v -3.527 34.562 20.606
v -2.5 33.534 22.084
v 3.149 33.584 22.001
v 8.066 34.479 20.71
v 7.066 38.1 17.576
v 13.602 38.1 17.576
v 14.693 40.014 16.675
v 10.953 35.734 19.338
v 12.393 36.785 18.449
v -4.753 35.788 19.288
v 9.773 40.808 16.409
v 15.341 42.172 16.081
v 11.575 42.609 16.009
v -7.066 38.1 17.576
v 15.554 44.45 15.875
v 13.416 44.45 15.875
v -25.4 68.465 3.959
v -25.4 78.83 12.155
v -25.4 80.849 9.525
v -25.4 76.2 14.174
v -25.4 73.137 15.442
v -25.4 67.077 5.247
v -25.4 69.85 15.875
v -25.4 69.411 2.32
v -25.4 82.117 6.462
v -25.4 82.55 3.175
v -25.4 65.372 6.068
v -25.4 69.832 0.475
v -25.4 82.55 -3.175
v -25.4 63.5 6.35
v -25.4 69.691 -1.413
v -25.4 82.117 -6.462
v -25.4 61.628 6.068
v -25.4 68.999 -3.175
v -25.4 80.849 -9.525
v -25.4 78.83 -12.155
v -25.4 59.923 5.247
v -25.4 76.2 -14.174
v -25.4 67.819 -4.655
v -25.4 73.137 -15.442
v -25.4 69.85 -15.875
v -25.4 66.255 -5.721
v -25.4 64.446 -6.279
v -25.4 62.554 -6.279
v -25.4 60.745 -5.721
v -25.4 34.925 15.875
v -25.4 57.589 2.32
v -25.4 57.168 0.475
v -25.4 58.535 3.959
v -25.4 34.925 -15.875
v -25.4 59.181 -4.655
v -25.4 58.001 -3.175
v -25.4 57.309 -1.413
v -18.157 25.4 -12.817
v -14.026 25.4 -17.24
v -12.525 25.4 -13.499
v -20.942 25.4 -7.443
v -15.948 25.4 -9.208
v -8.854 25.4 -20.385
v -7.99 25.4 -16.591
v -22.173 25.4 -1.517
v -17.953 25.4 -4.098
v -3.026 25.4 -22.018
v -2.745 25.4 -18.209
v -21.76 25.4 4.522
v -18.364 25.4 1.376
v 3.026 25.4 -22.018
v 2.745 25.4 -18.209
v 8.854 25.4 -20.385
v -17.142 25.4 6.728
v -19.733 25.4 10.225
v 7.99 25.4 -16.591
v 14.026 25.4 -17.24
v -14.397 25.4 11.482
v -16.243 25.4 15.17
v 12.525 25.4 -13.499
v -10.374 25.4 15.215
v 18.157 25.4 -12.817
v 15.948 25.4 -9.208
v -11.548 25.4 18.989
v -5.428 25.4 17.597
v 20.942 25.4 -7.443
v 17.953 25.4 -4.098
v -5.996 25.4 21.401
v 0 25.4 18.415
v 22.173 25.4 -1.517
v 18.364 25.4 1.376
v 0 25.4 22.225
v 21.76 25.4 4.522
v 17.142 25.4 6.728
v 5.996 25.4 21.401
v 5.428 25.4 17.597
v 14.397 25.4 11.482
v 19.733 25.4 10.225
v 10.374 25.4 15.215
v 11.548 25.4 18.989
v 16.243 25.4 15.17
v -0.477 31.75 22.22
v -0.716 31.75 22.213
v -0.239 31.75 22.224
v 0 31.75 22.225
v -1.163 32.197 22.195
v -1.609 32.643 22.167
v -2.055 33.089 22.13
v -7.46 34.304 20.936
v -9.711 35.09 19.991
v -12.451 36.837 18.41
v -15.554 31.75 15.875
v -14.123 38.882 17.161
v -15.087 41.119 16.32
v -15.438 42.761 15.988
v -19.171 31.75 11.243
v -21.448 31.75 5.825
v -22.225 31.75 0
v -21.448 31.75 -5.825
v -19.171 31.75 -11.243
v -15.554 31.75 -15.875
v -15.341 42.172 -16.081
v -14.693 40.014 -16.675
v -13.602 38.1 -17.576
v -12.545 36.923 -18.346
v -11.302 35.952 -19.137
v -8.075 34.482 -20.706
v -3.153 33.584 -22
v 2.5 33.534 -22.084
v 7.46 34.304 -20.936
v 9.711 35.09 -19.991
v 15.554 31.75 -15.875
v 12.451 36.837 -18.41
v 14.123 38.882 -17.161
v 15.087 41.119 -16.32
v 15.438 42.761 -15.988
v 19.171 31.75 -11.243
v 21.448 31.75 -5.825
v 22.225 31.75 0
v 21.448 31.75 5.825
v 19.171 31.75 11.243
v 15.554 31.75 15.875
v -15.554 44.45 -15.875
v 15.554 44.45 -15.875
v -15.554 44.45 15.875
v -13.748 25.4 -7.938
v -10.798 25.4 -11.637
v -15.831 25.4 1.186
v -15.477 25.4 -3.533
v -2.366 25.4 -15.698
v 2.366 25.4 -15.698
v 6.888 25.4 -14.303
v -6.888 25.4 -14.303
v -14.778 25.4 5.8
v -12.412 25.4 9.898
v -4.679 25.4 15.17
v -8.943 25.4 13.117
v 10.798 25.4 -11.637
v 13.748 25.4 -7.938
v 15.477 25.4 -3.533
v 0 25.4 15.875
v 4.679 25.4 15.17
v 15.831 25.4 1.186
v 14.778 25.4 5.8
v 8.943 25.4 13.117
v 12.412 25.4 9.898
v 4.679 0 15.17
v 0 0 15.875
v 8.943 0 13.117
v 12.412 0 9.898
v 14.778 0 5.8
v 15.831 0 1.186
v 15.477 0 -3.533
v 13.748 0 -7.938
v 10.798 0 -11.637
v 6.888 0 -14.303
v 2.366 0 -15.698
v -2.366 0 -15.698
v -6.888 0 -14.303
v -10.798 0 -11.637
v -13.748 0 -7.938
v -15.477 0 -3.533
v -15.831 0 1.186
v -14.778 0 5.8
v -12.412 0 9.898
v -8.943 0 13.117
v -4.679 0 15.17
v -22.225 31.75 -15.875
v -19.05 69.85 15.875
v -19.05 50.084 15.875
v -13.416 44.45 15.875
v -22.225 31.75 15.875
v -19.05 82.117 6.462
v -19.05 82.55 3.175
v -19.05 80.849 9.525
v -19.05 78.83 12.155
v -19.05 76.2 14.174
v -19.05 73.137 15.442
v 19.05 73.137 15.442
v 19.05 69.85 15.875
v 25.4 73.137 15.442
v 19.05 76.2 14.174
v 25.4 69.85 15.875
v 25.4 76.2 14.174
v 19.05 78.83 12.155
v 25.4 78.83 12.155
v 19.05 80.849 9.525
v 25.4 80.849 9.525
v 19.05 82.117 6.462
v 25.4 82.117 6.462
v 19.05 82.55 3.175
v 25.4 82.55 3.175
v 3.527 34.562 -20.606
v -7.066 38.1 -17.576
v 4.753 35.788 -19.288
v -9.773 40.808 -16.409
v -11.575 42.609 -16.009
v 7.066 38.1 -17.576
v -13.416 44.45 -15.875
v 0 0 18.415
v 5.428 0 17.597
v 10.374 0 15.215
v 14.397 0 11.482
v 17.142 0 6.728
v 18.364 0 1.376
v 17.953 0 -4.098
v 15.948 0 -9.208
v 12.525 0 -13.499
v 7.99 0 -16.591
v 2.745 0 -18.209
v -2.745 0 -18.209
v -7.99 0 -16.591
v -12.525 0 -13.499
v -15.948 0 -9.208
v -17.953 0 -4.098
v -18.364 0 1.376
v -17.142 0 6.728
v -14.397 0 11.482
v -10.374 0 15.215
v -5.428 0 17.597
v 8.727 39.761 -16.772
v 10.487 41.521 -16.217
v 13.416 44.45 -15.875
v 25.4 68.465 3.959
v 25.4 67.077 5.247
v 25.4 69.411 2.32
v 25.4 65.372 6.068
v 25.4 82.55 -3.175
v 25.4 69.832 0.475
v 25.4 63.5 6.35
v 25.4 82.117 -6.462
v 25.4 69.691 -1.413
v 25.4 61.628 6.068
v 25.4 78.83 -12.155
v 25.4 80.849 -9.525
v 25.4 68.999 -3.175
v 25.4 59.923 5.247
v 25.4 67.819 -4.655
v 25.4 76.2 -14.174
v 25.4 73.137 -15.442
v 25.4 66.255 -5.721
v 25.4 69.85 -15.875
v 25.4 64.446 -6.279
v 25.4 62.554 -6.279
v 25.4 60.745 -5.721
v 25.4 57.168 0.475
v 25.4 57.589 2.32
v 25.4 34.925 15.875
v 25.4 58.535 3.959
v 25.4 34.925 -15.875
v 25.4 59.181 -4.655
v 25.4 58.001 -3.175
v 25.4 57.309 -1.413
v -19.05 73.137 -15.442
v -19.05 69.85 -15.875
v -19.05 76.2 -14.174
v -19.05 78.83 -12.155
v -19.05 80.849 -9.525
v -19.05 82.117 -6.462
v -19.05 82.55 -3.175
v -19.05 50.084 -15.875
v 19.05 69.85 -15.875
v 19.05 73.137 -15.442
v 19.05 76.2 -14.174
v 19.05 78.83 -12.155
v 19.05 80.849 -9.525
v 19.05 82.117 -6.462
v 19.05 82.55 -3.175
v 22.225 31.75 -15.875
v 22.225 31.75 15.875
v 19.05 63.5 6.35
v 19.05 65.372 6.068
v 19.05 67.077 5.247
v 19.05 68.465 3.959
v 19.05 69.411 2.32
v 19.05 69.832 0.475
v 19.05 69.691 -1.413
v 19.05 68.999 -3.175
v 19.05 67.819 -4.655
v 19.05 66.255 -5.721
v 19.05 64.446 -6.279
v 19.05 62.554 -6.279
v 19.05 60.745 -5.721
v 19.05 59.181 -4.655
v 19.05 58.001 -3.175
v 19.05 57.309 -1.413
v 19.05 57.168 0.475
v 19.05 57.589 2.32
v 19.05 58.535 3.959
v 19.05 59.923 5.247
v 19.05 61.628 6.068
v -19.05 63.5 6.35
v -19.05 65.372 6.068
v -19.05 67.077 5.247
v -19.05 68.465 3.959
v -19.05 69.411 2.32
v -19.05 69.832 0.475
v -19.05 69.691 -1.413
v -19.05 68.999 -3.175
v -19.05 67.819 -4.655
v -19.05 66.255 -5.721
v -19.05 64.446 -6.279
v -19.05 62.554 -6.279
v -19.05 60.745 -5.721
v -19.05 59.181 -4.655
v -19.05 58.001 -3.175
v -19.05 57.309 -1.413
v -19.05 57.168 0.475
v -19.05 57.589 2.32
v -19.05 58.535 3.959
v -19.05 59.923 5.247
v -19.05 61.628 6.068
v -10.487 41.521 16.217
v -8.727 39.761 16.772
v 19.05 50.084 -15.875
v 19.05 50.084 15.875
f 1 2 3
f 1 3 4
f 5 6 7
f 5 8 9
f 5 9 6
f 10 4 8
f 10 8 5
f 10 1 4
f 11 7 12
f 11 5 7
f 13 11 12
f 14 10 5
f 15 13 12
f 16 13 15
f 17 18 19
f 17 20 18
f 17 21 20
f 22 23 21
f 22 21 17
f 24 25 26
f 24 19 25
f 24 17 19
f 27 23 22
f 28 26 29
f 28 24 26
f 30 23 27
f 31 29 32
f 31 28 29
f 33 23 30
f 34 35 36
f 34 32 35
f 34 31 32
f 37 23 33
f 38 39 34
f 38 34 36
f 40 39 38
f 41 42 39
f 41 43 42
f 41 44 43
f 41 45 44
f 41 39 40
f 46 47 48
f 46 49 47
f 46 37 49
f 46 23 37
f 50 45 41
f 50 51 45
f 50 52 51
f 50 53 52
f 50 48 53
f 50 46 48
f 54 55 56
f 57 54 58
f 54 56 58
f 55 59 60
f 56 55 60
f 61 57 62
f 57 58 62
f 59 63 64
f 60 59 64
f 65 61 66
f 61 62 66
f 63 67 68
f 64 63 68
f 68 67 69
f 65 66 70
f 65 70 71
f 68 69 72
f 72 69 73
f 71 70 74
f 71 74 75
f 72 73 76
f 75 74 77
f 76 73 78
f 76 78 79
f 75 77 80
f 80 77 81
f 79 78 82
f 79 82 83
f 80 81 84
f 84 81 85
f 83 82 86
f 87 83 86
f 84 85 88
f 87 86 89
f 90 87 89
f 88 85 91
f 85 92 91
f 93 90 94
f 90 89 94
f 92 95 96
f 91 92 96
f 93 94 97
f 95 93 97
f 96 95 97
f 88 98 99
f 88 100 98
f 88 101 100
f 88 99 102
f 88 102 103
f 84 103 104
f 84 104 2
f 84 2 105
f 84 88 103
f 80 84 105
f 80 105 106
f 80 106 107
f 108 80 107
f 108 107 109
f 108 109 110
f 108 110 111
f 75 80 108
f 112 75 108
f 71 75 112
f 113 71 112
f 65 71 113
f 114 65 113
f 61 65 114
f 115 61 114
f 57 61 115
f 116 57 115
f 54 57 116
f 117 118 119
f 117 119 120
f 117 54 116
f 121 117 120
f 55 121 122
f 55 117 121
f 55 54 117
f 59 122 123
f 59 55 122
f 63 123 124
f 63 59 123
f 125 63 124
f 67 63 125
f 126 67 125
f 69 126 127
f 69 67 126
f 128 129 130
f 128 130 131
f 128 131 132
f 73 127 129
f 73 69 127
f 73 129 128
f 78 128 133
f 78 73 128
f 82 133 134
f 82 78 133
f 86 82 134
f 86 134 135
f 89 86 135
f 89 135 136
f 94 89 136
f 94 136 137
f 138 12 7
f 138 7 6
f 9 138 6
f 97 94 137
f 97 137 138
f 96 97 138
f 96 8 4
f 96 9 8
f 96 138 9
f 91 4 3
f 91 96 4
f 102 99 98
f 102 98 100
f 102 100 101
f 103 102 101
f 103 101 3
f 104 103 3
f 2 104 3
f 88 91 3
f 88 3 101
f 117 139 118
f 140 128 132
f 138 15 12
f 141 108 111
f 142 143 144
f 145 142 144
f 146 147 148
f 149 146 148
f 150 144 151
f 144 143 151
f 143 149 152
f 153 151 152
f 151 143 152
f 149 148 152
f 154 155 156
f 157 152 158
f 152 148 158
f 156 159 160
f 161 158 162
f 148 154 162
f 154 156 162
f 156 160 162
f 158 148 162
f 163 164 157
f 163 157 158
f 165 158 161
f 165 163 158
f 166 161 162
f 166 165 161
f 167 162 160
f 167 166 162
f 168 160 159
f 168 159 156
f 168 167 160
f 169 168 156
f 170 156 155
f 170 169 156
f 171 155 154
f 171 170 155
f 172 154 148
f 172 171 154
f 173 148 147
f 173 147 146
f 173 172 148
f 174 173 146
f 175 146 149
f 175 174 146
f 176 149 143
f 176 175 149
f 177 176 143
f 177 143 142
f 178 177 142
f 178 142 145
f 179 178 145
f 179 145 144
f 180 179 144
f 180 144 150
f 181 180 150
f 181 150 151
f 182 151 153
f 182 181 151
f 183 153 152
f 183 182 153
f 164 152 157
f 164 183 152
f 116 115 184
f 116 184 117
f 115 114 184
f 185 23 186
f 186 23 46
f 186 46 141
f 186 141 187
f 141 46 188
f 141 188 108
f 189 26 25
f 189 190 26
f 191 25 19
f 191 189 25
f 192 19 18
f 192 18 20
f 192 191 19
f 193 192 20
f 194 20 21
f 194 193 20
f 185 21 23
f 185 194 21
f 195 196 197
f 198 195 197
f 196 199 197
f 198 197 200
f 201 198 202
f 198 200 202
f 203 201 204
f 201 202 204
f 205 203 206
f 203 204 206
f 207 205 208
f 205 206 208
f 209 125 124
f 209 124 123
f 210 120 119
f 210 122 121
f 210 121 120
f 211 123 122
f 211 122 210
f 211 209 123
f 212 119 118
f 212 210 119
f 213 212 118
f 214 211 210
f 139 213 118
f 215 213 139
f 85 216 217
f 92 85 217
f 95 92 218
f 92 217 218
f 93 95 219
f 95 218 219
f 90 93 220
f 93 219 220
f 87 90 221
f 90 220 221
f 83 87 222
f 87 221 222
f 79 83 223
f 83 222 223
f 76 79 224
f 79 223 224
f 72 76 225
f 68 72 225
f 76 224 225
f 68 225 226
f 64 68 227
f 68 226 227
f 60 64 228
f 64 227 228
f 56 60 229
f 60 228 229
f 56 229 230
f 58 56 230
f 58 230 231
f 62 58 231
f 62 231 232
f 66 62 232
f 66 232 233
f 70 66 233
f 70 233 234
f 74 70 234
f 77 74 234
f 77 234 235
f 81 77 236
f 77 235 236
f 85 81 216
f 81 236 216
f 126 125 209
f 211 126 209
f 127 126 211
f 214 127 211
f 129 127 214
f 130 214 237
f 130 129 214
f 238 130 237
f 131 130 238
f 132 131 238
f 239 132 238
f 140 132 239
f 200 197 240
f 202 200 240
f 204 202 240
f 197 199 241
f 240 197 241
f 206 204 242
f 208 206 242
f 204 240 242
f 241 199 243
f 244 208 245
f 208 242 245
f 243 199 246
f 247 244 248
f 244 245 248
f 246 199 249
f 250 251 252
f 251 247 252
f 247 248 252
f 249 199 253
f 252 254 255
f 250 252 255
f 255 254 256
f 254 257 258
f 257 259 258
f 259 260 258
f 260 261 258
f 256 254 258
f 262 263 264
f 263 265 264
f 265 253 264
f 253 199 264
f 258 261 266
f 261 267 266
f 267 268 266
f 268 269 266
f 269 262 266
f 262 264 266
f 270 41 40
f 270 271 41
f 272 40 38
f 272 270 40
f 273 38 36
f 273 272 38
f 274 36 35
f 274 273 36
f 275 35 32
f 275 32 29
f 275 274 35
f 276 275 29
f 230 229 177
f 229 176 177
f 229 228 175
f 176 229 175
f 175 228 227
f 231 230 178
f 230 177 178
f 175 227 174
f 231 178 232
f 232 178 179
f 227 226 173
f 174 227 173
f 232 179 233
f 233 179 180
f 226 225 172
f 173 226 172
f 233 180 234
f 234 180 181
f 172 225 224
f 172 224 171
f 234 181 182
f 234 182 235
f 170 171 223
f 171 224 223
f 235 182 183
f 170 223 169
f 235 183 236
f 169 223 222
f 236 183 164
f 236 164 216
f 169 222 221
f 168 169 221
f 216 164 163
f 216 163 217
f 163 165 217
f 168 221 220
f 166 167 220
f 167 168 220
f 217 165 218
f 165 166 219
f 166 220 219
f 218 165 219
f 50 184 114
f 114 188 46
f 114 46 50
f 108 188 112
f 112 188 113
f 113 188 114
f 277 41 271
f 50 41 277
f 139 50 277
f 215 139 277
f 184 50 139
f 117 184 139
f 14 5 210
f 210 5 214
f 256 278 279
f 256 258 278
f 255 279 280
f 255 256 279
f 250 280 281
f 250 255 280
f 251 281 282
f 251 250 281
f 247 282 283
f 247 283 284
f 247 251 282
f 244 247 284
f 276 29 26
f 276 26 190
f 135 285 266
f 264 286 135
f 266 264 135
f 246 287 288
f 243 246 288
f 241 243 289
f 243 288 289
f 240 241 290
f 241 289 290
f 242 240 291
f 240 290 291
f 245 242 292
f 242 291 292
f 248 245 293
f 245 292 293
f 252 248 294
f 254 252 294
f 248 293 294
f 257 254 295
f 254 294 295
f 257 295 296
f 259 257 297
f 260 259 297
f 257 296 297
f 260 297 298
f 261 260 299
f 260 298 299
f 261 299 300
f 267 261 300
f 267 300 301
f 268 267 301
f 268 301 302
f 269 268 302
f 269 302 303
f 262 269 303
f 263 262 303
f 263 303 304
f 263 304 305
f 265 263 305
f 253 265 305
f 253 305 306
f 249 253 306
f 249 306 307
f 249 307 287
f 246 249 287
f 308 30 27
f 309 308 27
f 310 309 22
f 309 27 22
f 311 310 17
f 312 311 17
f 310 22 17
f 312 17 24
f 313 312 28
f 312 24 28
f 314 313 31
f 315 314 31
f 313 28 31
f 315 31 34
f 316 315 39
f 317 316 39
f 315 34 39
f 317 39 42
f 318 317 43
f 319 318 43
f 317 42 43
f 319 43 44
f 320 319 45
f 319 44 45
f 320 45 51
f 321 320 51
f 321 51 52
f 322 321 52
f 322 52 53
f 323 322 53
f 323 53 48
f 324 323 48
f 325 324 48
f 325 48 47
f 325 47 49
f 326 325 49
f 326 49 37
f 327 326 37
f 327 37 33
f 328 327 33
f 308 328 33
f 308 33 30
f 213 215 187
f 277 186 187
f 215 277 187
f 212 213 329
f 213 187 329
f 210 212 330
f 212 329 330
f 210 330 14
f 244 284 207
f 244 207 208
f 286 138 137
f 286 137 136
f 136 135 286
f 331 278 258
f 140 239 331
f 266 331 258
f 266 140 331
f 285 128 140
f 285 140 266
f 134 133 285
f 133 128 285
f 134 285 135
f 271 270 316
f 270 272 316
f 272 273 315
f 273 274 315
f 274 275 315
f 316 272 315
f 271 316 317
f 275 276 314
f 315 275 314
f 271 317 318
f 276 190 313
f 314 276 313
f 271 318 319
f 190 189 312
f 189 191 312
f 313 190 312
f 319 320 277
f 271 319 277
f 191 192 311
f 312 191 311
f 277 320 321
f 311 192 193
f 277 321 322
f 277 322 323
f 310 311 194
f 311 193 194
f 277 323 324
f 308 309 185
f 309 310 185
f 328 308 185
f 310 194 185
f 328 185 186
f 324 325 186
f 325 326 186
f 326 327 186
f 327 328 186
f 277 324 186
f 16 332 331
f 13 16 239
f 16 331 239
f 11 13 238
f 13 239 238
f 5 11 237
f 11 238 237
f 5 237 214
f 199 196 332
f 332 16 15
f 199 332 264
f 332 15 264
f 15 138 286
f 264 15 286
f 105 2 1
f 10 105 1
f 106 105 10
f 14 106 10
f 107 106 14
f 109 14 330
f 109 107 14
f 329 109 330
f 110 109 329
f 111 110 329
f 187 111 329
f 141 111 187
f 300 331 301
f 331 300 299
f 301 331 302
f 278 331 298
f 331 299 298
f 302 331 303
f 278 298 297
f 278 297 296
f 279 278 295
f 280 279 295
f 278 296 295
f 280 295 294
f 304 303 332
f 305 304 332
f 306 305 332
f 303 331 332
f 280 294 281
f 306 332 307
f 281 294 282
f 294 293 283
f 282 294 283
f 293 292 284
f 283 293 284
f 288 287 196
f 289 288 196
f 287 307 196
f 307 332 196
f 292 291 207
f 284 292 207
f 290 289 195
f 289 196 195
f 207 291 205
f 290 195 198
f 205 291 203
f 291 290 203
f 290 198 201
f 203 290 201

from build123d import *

# Parameters (mm, degrees)
SKETCH2_R           = 18.415
SKETCH2_R_2         = 15.875
BOSS_EXTRUDE1_DEPTH = 25.4
SKETCH3_R           = 22.225
BOSS_EXTRUDE2_DEPTH = 6.35
SKETCH5_W           = 50.8
SKETCH5_H           = 31.75
BOSS_EXTRUDE3_DEPTH = 50.8
CUT_EXTRUDE2_DEPTH  = 50.8
FILLET1_R           = 12.7
SKETCH9_R           = 6.35
CUT_EXTRUDE3_DEPTH  = 100.443919497
FILLET2_R           = 12.7


with BuildPart() as part:
    # Sketch2 → Boss-Extrude1 (new body)
    with BuildSketch(Plane(origin=(0, 0, 0), x_dir=(1, 0, 0), z_dir=(0, 1, 0))):
        with Locations(Location((0, 0, 0), (0, 0, 270))):
            Circle(SKETCH2_R)
        with Locations(Location((0, 0, 0), (0, 0, 270))):
            Circle(SKETCH2_R_2, mode=Mode.SUBTRACT)
    extrude(amount=BOSS_EXTRUDE1_DEPTH)

    # Sketch3 → Boss-Extrude2 (add)
    with BuildSketch(Plane(origin=(0, 25.4, 0), x_dir=(1, 0, 0), z_dir=(0, 1, 0))):
        with Locations(Location((0, 0, 0), (0, 0, 270))):
            Circle(SKETCH3_R)
    extrude(amount=BOSS_EXTRUDE2_DEPTH)

    # Sketch5 → Boss-Extrude3 (add)
    with BuildSketch(Plane(origin=(0, 31.75, 0), x_dir=(1, 0, 0), z_dir=(0, 1, 0))):
        Rectangle(SKETCH5_W, SKETCH5_H)
    extrude(amount=BOSS_EXTRUDE3_DEPTH)

    # Sketch7 → Cut-Extrude2 (cut)
    with BuildSketch(Plane.XY.offset(15.875)):
        Polygon((19.05, 82.55), (-19.05, 82.55), (-19.05, 50.084319149), (-7.065680851, 38.1), (7.065680851, 38.1), (19.05, 50.084319149), align=None)
        Polygon((-22.225, 31.75), (-25.4, 34.925), (-25.4, 31.75), align=None)
        Polygon((22.225, 31.75), (25.4, 34.925), (25.4, 31.75), align=None)
    extrude(amount=-CUT_EXTRUDE2_DEPTH, mode=Mode.SUBTRACT)

    # Fillet1
    fillet1_edges = [part.edges().sort_by_distance(p)[0] for p in [
        (22.225, 82.55, -15.875),
        (-22.225, 82.55, 15.875),
        (-22.225, 82.55, -15.875),
        (22.225, 82.55, 15.875),
    ]]
    fillet(fillet1_edges, radius=FILLET1_R)

    # Sketch9 → Cut-Extrude3 (cut, through all)
    with BuildSketch(Plane.ZY.offset(25.4)):
        with Locations((0, 63.5)):
            Circle(SKETCH9_R)
    extrude(amount=-CUT_EXTRUDE3_DEPTH, mode=Mode.SUBTRACT)

    # Fillet2
    # the kernel refuses this fillet: 12.7 mm, written as the material it adds along each edge
    with BuildSketch(Plane(origin=(-47.304259867, 31.75, 15.875), x_dir=(0, 1, 0), z_dir=(1, 0, 0))) as fillet2_piece_1_section:
        with BuildLine():
            CenterArc((FILLET2_R, FILLET2_R), FILLET2_R, 180, 90)
            Line((0, FILLET2_R), (0, 0))
            Line((0, 0), (FILLET2_R, 0))
        make_face()
    fillet2_piece_1 = extrude(amount=94.608519733, mode=Mode.PRIVATE)
    fillet2_piece_1 = split(fillet2_piece_1, bisect_by=Plane(origin=(-10.08116257, 41.115481719, 16.394719063), z_dir=(-0.7071067811865479, -0.7071067811865472, 0)), keep=Keep.TOP, mode=Mode.PRIVATE)
    fillet2_piece_1 = fillet2_piece_1 & Plane(origin=(0, 39.477824878, 0), x_dir=(0, 0, 1), z_dir=(0, -1, 0)) * Cylinder(22.225, 241, mode=Mode.PRIVATE)
    add(fillet2_piece_1)
    with BuildSketch(Plane(origin=(-47.304259867, 31.75, 15.875), x_dir=(0, 1, 0), z_dir=(1, 0, 0))) as fillet2_piece_2_section:
        with BuildLine():
            CenterArc((FILLET2_R, FILLET2_R), FILLET2_R, 180, 90)
            Line((0, FILLET2_R), (0, 0))
            Line((0, 0), (FILLET2_R, 0))
        make_face()
    fillet2_piece_2 = extrude(amount=94.608519733, mode=Mode.PRIVATE)
    fillet2_piece_2 = split(fillet2_piece_2, bisect_by=Plane(origin=(1e-09, 38.1, 17.97624181), z_dir=(0, -1, 0)), keep=Keep.TOP, mode=Mode.PRIVATE)
    fillet2_piece_2 = fillet2_piece_2 & Plane(origin=(0, 35.120576784, 0), x_dir=(0, 0, 1), z_dir=(0, -1, 0)) * Cylinder(22.225, 241, mode=Mode.PRIVATE)
    add(fillet2_piece_2)
    with BuildSketch(Plane(origin=(-47.304259867, 31.75, 15.875), x_dir=(0, 1, 0), z_dir=(1, 0, 0))) as fillet2_piece_3_section:
        with BuildLine():
            CenterArc((FILLET2_R, FILLET2_R), FILLET2_R, 180, 90)
            Line((0, FILLET2_R), (0, 0))
            Line((0, 0), (FILLET2_R, 0))
        make_face()
    fillet2_piece_3 = extrude(amount=94.608519733, mode=Mode.PRIVATE)
    fillet2_piece_3 = split(fillet2_piece_3, bisect_by=Plane(origin=(10.081162473, 41.115481622, 16.394719049), z_dir=(0.7071067811865472, -0.7071067811865478, 0)), keep=Keep.TOP, mode=Mode.PRIVATE)
    fillet2_piece_3 = fillet2_piece_3 & Plane(origin=(0, 39.477824822, 0), x_dir=(0, 0, 1), z_dir=(0, -1, 0)) * Cylinder(22.225, 241, mode=Mode.PRIVATE)
    add(fillet2_piece_3)
    with BuildSketch(Plane(origin=(47.304259867, 31.75, -15.875), x_dir=(0, 1, 0), z_dir=(-1, 0, 0))) as fillet2_piece_4_section:
        with BuildLine():
            CenterArc((FILLET2_R, FILLET2_R), FILLET2_R, 180, 90)
            Line((0, FILLET2_R), (0, 0))
            Line((0, 0), (FILLET2_R, 0))
        make_face()
    fillet2_piece_4 = extrude(amount=94.608519733, mode=Mode.PRIVATE)
    fillet2_piece_4 = split(fillet2_piece_4, bisect_by=Plane(origin=(10.08116257, 41.115481719, -16.394719063), z_dir=(0.7071067811865472, -0.7071067811865478, 0)), keep=Keep.TOP, mode=Mode.PRIVATE)
    fillet2_piece_4 = fillet2_piece_4 & Plane(origin=(0, 39.477824879, 0), x_dir=(0, 0, 1), z_dir=(0, -1, 0)) * Cylinder(22.225, 241, mode=Mode.PRIVATE)
    add(fillet2_piece_4)
    with BuildSketch(Plane(origin=(47.304259867, 31.75, -15.875), x_dir=(0, 1, 0), z_dir=(-1, 0, 0))) as fillet2_piece_5_section:
        with BuildLine():
            CenterArc((FILLET2_R, FILLET2_R), FILLET2_R, 180, 90)
            Line((0, FILLET2_R), (0, 0))
            Line((0, 0), (FILLET2_R, 0))
        make_face()
    fillet2_piece_5 = extrude(amount=94.608519733, mode=Mode.PRIVATE)
    fillet2_piece_5 = split(fillet2_piece_5, bisect_by=Plane(origin=(0, 38.1, -17.976241803), z_dir=(0, -1, 0)), keep=Keep.TOP, mode=Mode.PRIVATE)
    fillet2_piece_5 = fillet2_piece_5 & Plane(origin=(0, 35.120576783, 0), x_dir=(0, 0, 1), z_dir=(0, -1, 0)) * Cylinder(22.225, 241, mode=Mode.PRIVATE)
    add(fillet2_piece_5)
    with BuildSketch(Plane(origin=(47.304259867, 31.75, -15.875), x_dir=(0, 1, 0), z_dir=(-1, 0, 0))) as fillet2_piece_6_section:
        with BuildLine():
            CenterArc((FILLET2_R, FILLET2_R), FILLET2_R, 180, 90)
            Line((0, FILLET2_R), (0, 0))
            Line((0, 0), (FILLET2_R, 0))
        make_face()
    fillet2_piece_6 = extrude(amount=94.608519733, mode=Mode.PRIVATE)
    fillet2_piece_6 = split(fillet2_piece_6, bisect_by=Plane(origin=(-10.081162473, 41.115481622, -16.394719049), z_dir=(-0.7071067811865479, -0.7071067811865472, 0)), keep=Keep.TOP, mode=Mode.PRIVATE)
    fillet2_piece_6 = fillet2_piece_6 & Plane(origin=(0, 39.477824822, 0), x_dir=(0, 0, 1), z_dir=(0, -1, 0)) * Cylinder(22.225, 241, mode=Mode.PRIVATE)
    add(fillet2_piece_6)


solid = part.part
